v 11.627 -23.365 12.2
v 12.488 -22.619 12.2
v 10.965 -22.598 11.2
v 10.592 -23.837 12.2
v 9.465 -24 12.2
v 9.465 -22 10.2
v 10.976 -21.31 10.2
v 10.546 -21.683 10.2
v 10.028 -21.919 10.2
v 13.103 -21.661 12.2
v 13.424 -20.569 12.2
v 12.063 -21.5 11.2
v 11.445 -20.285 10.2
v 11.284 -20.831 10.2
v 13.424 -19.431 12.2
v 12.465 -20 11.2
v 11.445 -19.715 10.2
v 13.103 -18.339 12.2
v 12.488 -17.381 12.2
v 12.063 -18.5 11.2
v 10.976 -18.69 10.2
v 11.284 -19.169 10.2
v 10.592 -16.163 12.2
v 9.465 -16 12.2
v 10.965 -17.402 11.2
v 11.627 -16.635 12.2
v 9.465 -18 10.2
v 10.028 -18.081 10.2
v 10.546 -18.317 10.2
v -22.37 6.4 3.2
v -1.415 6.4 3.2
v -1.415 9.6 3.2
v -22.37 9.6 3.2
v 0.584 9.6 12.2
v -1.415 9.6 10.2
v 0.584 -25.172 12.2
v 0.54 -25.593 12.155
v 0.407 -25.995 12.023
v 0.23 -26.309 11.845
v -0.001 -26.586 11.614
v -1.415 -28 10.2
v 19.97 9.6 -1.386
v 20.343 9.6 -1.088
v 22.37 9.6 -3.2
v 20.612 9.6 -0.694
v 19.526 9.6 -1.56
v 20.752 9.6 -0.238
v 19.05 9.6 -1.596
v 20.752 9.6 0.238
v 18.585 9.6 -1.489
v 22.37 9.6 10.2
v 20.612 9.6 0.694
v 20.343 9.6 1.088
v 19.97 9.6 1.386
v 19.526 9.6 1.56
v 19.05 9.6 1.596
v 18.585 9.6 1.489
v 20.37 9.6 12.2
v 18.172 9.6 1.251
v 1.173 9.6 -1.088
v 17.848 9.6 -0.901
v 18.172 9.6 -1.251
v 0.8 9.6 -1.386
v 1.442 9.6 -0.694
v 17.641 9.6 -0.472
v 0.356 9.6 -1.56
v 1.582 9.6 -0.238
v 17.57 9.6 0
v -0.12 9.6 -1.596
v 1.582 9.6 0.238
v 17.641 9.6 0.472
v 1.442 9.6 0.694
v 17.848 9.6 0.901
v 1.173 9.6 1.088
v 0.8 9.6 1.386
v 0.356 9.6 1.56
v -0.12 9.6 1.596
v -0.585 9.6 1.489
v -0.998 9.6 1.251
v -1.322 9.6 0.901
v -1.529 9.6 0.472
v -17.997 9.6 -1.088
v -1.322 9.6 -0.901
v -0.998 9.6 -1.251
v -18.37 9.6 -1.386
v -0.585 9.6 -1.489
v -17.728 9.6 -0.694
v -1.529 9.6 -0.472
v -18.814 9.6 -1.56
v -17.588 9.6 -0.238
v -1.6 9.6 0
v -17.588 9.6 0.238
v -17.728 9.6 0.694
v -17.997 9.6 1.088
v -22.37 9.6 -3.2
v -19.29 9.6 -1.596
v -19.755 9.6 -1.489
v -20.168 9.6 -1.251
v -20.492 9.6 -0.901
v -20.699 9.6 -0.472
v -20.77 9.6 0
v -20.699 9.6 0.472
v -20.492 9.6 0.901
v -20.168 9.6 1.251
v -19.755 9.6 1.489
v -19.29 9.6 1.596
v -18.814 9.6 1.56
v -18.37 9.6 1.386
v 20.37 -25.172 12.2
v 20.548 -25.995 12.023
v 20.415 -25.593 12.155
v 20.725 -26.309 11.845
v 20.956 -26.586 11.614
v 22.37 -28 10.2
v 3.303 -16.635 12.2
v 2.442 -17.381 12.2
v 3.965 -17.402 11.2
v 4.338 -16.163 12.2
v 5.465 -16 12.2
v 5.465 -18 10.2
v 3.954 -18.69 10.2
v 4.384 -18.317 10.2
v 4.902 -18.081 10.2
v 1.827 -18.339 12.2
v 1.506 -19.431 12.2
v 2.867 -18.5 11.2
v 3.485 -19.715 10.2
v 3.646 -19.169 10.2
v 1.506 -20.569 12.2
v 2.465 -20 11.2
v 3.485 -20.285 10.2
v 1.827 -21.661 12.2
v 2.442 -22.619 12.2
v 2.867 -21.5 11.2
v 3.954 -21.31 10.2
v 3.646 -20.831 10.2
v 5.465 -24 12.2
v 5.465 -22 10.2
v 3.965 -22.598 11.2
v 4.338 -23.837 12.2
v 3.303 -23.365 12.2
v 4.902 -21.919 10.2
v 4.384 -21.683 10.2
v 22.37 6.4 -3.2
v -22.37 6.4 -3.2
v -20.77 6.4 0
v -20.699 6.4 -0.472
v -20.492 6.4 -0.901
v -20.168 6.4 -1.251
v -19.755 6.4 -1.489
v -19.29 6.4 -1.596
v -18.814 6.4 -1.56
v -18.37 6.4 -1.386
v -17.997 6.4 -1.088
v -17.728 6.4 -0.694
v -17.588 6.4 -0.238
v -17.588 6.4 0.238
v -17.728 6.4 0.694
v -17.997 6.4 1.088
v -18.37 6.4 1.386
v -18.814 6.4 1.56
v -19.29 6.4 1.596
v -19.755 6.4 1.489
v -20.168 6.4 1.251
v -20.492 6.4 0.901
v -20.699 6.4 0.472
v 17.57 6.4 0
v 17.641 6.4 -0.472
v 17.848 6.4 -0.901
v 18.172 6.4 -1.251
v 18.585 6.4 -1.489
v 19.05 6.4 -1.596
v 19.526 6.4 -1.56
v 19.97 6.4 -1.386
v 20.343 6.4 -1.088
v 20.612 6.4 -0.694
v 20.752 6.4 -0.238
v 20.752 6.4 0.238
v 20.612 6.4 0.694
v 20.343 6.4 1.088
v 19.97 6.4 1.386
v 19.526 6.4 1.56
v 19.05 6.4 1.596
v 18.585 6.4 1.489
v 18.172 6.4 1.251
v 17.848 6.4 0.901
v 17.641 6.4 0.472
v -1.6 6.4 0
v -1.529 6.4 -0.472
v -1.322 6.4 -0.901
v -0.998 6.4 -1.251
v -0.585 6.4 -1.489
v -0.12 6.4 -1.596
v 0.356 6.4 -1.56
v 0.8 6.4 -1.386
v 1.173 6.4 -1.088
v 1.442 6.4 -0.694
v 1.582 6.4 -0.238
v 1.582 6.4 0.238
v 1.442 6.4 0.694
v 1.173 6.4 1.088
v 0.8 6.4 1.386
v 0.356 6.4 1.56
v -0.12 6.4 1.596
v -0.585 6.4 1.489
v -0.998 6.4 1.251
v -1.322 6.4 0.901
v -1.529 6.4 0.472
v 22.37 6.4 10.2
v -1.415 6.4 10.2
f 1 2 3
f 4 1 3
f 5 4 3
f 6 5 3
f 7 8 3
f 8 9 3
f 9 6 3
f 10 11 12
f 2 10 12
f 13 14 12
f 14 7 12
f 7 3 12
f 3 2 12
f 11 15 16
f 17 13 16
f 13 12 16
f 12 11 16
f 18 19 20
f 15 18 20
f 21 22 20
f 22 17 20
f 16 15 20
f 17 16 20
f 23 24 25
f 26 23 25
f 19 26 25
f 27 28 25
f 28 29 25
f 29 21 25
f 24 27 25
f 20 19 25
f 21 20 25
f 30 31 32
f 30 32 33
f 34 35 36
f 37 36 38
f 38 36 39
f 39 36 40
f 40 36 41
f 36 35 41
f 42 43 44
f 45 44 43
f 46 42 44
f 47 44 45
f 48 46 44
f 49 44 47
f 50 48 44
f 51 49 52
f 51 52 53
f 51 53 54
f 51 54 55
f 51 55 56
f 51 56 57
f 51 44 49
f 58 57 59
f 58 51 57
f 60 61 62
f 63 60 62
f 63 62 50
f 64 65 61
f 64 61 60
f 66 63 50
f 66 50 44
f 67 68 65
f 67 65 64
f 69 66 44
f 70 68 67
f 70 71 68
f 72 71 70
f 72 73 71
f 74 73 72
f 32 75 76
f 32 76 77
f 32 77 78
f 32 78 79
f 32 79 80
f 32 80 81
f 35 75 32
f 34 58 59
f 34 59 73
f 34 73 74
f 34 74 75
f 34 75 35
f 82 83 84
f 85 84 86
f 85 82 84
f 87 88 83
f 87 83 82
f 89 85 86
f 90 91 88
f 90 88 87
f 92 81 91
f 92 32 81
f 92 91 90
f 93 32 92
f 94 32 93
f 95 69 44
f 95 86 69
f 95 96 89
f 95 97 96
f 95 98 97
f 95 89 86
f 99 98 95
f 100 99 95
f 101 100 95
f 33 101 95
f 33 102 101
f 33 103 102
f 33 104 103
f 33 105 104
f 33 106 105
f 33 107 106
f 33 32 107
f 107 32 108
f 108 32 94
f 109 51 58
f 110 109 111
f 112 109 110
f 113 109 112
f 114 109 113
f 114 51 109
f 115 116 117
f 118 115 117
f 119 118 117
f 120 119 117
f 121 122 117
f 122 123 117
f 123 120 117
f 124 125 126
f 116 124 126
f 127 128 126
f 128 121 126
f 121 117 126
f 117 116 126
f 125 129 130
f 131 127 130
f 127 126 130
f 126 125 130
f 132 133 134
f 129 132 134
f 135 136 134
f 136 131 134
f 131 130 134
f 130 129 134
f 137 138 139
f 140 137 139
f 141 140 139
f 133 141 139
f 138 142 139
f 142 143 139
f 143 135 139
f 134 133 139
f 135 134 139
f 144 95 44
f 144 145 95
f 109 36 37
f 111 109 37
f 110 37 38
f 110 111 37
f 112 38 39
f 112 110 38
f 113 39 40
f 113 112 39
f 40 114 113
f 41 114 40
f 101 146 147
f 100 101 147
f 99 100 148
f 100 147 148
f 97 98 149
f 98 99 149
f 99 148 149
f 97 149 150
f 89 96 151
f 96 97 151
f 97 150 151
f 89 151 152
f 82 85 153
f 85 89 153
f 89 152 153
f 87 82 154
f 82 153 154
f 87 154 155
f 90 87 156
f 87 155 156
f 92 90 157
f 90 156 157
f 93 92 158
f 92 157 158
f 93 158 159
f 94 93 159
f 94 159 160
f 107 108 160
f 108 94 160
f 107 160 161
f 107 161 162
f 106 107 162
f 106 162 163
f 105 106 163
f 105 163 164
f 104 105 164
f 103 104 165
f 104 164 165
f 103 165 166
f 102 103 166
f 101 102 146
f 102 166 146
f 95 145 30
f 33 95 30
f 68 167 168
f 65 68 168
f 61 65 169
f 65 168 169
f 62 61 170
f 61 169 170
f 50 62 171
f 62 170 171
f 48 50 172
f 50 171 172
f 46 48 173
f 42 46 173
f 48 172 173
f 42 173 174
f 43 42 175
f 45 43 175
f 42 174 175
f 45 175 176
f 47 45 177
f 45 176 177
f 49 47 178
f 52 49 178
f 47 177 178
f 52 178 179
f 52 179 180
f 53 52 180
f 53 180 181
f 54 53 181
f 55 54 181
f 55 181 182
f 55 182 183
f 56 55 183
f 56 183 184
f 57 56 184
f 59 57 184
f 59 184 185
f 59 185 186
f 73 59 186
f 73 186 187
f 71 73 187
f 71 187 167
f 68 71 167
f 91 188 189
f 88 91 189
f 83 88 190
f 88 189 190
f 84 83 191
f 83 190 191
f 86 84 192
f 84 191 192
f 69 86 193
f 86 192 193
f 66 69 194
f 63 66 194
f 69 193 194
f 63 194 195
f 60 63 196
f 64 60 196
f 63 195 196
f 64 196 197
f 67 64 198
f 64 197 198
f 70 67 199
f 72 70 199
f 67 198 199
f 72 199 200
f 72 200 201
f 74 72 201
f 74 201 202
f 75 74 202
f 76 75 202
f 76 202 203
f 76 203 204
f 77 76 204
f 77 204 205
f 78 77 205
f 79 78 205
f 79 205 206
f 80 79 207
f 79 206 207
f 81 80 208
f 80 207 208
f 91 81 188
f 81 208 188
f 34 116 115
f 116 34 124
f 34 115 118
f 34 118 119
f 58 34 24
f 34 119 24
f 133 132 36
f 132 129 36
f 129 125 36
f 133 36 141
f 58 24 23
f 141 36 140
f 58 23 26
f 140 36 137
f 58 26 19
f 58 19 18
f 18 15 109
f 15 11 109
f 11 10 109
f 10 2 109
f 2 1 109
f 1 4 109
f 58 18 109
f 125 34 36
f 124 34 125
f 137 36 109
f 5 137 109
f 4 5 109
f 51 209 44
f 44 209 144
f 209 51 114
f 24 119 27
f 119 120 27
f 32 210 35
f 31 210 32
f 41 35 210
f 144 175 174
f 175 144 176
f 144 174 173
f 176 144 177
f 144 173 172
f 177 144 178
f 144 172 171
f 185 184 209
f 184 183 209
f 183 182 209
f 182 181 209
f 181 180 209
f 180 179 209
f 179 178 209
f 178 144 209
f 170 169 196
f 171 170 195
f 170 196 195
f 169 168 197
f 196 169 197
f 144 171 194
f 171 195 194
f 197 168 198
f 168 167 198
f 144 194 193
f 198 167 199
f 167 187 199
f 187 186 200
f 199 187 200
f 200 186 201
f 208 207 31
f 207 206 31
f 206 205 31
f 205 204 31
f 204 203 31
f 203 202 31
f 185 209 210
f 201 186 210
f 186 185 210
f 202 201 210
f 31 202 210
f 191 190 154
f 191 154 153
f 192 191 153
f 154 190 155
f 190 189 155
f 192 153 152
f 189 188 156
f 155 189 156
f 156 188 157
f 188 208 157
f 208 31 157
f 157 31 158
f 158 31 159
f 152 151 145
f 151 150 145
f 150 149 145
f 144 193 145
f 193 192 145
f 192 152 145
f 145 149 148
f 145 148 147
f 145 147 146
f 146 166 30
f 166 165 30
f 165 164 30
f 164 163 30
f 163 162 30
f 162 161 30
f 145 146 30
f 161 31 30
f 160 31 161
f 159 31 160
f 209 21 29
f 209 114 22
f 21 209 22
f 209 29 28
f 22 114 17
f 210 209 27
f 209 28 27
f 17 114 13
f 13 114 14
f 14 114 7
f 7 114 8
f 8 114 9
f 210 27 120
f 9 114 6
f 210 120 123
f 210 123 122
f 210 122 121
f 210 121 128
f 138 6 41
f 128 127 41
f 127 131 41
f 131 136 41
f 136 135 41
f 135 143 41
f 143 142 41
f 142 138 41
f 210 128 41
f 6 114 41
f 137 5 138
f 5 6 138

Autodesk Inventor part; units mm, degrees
ref_plane "YZ Plane" through (0, 0, 0) normal (1, 0, 0) x (0, 1, 0)
ref_plane "XZ Plane" through (0, 0, 0) normal (0, 1, 0) x (-1, 0, 0)
ref_plane "XY Plane" through (0, 0, 0) normal (0, 0, 1) x (1, 0, 0)
sketch "Sketch1" plane through (0, 0, 0) normal (0, 1, 0) x (-1, 0, 0)
  line L0 (0, 0) -> (-19.17, 0)
  circle A0 centre (0, 0) radius 1.6
  circle A1 centre (-19.17, 0) radius 1.6
  line L1 (-19.17, 0) -> (-22.37, 0)
  line L2 (0, 0) -> (3.2, 0)
  line L3 (-22.37, 0) -> (-22.37, 3.2)
  line L4 (3.2, 0) -> (3.2, -3.2)
  line L5 (3.2, -3.2) -> (-22.37, -3.2)
  line L6 (-22.37, -3.2) -> (-22.37, 3.2)
  line L7 (-22.37, 3.2) -> (3.2, 3.2)
  line L8 (3.2, 3.2) -> (3.2, -3.2)
  line L9 (3.2, 3.2) -> (3.2, 10.2)
  line L10 (3.2, 10.2) -> (3.2, 12.2)
  line L11 (3.2, 12.2) -> (-22.37, 12.2)
  line L12 (-22.37, 12.2) -> (-22.37, 10.2)
  line L13 (-22.37, 10.2) -> (3.2, 10.2)
  line L14 (-22.37, 3.2) -> (-22.37, 10.2)
  line L15 (-9.585, 12.2) -> (1.415, 12.2)
  line L16 (-9.585, 12.2) -> (-15.985, 12.2)
  line L17 (-15.985, 12.2) -> (-15.985, 10.2)
  line L18 (1.415, 12.2) -> (1.415, 10.2)
  line L19 (0, 0) -> (0, -3.2)
  circle A2 centre (19.17, 0) radius 1.6
  line L20 (22.37, 0) -> (22.37, 3.2)
  line L21 (-3.2, 0) -> (-3.2, -3.2)
  line L22 (-3.2, -3.2) -> (22.37, -3.2)
  line L23 (22.37, -3.2) -> (22.37, 3.2)
  line L24 (22.37, 3.2) -> (-3.2, 3.2)
  line L25 (-3.2, 3.2) -> (-3.2, -3.2)
  line L26 (3.2, 10.2) -> (8.2, 10.2)
  line L27 (8.2, 10.2) -> (8.2, 3.2)
  line L28 (8.2, 10.2) -> (8.2, 12.2)
  line L29 (8.2, 12.2) -> (3.2, 12.2)
  line L30 (1.415, 10.2) -> (1.415, 3.2)
  line L31 (-15.985, 10.2) -> (-15.985, 3.2)
  point P0 (3.2, 3.2)
  point P1 (3.2, 3.2)
  point P2 (1.415, 3.2)
  dimension "d0" = 19.17
  dimension "d1" = 3.2
  dimension "d2" = 3.2
  dimension "d3" = 3.2
  dimension "d4" = 3.2
  dimension "d5" = 3.2
  dimension "d6" = 3.2
  dimension "d7" = 7
  dimension "d8" = 2
  dimension "d21" = 11
  dimension "d22" = 6.4
  dimension "d30" = 5
extrude "Extrusion1" add sketch "Sketch1" along normal blind 6.4 contours L17 L11 L18 L13 | L13 L12 L11 L17
extrude "Extrusion2" add sketch "Sketch1" along normal blind 3.2 from surface at 6.4 contours L21 L5 L6 L1 A1 L0 | L25 L7 L8 L2 A0 L0 | L0 A0 L19 L5 L21 | L0 A1 L1 L3 L7 L25 | L7 L31 L13 L30 | L2 L4 L5 L19 A0 | L7 L14 L13 L31 | L8 L24 L20 L23 L22 L4 | L17 L11 L18 L13 | L13 L12 L11 L17
extrude "Extrusion3" add sketch "Sketch1" against normal blind 28 contours L17 L11 L18 L13 | L13 L12 L11 L17
sketch "Sketch2" plane through (-3.2, 9.6, 12.2) normal (0, 0, 1) x (1, 0, 0)
  line L0 (0, 0) -> (0, -9.6)
  line L1 (0, -9.6) -> (0, -29.6)
  line L2 (-3.2, -29.6) -> (21.33, -29.6)
  line L3 (9.065, -30.1) -> (5.865, -30.1)
  line L4 (9.065, -29.6) -> (12.265, -29.6)
  line L5 (0, -3.2) -> (0, 0) projected
  line L6 (0, 0) -> (0, -9.6)
  arc A0 (8.665, -27.6) -> (8.665, -31.6) centre (8.665, -29.6) ccw
  line L7 (8.665, -27.6) -> (12.665, -27.6)
  line L8 (12.665, -31.6) -> (8.665, -31.6)
  arc A1 (12.665, -31.6) -> (12.665, -27.6) centre (12.665, -29.6) ccw
  point P0 (3.2, -9.6)
  point P1 (0, -30.1)
  dimension "d16" = 20
  dimension "d18" = 3.2
  dimension "d23" = 9.6
extrude "Extrusion4" cut sketch "Sketch2" against normal through all
chamfer "Chamfer2" distance 2 angle 45 7 edges at (7.465, -18, 12.2) (11.465, -20, 12.2) (7.465, -22, 12.2) (3.465, -20, 12.2) (22.37, -9.2, 12.2) (10.4775, -28, 12.2) (-1.415, -9.2, 12.2)
fillet "Fillet2" radius 2 1 edges at (10.4775, -26.0005, 12.2)
properties part number "enclosure mounter"
